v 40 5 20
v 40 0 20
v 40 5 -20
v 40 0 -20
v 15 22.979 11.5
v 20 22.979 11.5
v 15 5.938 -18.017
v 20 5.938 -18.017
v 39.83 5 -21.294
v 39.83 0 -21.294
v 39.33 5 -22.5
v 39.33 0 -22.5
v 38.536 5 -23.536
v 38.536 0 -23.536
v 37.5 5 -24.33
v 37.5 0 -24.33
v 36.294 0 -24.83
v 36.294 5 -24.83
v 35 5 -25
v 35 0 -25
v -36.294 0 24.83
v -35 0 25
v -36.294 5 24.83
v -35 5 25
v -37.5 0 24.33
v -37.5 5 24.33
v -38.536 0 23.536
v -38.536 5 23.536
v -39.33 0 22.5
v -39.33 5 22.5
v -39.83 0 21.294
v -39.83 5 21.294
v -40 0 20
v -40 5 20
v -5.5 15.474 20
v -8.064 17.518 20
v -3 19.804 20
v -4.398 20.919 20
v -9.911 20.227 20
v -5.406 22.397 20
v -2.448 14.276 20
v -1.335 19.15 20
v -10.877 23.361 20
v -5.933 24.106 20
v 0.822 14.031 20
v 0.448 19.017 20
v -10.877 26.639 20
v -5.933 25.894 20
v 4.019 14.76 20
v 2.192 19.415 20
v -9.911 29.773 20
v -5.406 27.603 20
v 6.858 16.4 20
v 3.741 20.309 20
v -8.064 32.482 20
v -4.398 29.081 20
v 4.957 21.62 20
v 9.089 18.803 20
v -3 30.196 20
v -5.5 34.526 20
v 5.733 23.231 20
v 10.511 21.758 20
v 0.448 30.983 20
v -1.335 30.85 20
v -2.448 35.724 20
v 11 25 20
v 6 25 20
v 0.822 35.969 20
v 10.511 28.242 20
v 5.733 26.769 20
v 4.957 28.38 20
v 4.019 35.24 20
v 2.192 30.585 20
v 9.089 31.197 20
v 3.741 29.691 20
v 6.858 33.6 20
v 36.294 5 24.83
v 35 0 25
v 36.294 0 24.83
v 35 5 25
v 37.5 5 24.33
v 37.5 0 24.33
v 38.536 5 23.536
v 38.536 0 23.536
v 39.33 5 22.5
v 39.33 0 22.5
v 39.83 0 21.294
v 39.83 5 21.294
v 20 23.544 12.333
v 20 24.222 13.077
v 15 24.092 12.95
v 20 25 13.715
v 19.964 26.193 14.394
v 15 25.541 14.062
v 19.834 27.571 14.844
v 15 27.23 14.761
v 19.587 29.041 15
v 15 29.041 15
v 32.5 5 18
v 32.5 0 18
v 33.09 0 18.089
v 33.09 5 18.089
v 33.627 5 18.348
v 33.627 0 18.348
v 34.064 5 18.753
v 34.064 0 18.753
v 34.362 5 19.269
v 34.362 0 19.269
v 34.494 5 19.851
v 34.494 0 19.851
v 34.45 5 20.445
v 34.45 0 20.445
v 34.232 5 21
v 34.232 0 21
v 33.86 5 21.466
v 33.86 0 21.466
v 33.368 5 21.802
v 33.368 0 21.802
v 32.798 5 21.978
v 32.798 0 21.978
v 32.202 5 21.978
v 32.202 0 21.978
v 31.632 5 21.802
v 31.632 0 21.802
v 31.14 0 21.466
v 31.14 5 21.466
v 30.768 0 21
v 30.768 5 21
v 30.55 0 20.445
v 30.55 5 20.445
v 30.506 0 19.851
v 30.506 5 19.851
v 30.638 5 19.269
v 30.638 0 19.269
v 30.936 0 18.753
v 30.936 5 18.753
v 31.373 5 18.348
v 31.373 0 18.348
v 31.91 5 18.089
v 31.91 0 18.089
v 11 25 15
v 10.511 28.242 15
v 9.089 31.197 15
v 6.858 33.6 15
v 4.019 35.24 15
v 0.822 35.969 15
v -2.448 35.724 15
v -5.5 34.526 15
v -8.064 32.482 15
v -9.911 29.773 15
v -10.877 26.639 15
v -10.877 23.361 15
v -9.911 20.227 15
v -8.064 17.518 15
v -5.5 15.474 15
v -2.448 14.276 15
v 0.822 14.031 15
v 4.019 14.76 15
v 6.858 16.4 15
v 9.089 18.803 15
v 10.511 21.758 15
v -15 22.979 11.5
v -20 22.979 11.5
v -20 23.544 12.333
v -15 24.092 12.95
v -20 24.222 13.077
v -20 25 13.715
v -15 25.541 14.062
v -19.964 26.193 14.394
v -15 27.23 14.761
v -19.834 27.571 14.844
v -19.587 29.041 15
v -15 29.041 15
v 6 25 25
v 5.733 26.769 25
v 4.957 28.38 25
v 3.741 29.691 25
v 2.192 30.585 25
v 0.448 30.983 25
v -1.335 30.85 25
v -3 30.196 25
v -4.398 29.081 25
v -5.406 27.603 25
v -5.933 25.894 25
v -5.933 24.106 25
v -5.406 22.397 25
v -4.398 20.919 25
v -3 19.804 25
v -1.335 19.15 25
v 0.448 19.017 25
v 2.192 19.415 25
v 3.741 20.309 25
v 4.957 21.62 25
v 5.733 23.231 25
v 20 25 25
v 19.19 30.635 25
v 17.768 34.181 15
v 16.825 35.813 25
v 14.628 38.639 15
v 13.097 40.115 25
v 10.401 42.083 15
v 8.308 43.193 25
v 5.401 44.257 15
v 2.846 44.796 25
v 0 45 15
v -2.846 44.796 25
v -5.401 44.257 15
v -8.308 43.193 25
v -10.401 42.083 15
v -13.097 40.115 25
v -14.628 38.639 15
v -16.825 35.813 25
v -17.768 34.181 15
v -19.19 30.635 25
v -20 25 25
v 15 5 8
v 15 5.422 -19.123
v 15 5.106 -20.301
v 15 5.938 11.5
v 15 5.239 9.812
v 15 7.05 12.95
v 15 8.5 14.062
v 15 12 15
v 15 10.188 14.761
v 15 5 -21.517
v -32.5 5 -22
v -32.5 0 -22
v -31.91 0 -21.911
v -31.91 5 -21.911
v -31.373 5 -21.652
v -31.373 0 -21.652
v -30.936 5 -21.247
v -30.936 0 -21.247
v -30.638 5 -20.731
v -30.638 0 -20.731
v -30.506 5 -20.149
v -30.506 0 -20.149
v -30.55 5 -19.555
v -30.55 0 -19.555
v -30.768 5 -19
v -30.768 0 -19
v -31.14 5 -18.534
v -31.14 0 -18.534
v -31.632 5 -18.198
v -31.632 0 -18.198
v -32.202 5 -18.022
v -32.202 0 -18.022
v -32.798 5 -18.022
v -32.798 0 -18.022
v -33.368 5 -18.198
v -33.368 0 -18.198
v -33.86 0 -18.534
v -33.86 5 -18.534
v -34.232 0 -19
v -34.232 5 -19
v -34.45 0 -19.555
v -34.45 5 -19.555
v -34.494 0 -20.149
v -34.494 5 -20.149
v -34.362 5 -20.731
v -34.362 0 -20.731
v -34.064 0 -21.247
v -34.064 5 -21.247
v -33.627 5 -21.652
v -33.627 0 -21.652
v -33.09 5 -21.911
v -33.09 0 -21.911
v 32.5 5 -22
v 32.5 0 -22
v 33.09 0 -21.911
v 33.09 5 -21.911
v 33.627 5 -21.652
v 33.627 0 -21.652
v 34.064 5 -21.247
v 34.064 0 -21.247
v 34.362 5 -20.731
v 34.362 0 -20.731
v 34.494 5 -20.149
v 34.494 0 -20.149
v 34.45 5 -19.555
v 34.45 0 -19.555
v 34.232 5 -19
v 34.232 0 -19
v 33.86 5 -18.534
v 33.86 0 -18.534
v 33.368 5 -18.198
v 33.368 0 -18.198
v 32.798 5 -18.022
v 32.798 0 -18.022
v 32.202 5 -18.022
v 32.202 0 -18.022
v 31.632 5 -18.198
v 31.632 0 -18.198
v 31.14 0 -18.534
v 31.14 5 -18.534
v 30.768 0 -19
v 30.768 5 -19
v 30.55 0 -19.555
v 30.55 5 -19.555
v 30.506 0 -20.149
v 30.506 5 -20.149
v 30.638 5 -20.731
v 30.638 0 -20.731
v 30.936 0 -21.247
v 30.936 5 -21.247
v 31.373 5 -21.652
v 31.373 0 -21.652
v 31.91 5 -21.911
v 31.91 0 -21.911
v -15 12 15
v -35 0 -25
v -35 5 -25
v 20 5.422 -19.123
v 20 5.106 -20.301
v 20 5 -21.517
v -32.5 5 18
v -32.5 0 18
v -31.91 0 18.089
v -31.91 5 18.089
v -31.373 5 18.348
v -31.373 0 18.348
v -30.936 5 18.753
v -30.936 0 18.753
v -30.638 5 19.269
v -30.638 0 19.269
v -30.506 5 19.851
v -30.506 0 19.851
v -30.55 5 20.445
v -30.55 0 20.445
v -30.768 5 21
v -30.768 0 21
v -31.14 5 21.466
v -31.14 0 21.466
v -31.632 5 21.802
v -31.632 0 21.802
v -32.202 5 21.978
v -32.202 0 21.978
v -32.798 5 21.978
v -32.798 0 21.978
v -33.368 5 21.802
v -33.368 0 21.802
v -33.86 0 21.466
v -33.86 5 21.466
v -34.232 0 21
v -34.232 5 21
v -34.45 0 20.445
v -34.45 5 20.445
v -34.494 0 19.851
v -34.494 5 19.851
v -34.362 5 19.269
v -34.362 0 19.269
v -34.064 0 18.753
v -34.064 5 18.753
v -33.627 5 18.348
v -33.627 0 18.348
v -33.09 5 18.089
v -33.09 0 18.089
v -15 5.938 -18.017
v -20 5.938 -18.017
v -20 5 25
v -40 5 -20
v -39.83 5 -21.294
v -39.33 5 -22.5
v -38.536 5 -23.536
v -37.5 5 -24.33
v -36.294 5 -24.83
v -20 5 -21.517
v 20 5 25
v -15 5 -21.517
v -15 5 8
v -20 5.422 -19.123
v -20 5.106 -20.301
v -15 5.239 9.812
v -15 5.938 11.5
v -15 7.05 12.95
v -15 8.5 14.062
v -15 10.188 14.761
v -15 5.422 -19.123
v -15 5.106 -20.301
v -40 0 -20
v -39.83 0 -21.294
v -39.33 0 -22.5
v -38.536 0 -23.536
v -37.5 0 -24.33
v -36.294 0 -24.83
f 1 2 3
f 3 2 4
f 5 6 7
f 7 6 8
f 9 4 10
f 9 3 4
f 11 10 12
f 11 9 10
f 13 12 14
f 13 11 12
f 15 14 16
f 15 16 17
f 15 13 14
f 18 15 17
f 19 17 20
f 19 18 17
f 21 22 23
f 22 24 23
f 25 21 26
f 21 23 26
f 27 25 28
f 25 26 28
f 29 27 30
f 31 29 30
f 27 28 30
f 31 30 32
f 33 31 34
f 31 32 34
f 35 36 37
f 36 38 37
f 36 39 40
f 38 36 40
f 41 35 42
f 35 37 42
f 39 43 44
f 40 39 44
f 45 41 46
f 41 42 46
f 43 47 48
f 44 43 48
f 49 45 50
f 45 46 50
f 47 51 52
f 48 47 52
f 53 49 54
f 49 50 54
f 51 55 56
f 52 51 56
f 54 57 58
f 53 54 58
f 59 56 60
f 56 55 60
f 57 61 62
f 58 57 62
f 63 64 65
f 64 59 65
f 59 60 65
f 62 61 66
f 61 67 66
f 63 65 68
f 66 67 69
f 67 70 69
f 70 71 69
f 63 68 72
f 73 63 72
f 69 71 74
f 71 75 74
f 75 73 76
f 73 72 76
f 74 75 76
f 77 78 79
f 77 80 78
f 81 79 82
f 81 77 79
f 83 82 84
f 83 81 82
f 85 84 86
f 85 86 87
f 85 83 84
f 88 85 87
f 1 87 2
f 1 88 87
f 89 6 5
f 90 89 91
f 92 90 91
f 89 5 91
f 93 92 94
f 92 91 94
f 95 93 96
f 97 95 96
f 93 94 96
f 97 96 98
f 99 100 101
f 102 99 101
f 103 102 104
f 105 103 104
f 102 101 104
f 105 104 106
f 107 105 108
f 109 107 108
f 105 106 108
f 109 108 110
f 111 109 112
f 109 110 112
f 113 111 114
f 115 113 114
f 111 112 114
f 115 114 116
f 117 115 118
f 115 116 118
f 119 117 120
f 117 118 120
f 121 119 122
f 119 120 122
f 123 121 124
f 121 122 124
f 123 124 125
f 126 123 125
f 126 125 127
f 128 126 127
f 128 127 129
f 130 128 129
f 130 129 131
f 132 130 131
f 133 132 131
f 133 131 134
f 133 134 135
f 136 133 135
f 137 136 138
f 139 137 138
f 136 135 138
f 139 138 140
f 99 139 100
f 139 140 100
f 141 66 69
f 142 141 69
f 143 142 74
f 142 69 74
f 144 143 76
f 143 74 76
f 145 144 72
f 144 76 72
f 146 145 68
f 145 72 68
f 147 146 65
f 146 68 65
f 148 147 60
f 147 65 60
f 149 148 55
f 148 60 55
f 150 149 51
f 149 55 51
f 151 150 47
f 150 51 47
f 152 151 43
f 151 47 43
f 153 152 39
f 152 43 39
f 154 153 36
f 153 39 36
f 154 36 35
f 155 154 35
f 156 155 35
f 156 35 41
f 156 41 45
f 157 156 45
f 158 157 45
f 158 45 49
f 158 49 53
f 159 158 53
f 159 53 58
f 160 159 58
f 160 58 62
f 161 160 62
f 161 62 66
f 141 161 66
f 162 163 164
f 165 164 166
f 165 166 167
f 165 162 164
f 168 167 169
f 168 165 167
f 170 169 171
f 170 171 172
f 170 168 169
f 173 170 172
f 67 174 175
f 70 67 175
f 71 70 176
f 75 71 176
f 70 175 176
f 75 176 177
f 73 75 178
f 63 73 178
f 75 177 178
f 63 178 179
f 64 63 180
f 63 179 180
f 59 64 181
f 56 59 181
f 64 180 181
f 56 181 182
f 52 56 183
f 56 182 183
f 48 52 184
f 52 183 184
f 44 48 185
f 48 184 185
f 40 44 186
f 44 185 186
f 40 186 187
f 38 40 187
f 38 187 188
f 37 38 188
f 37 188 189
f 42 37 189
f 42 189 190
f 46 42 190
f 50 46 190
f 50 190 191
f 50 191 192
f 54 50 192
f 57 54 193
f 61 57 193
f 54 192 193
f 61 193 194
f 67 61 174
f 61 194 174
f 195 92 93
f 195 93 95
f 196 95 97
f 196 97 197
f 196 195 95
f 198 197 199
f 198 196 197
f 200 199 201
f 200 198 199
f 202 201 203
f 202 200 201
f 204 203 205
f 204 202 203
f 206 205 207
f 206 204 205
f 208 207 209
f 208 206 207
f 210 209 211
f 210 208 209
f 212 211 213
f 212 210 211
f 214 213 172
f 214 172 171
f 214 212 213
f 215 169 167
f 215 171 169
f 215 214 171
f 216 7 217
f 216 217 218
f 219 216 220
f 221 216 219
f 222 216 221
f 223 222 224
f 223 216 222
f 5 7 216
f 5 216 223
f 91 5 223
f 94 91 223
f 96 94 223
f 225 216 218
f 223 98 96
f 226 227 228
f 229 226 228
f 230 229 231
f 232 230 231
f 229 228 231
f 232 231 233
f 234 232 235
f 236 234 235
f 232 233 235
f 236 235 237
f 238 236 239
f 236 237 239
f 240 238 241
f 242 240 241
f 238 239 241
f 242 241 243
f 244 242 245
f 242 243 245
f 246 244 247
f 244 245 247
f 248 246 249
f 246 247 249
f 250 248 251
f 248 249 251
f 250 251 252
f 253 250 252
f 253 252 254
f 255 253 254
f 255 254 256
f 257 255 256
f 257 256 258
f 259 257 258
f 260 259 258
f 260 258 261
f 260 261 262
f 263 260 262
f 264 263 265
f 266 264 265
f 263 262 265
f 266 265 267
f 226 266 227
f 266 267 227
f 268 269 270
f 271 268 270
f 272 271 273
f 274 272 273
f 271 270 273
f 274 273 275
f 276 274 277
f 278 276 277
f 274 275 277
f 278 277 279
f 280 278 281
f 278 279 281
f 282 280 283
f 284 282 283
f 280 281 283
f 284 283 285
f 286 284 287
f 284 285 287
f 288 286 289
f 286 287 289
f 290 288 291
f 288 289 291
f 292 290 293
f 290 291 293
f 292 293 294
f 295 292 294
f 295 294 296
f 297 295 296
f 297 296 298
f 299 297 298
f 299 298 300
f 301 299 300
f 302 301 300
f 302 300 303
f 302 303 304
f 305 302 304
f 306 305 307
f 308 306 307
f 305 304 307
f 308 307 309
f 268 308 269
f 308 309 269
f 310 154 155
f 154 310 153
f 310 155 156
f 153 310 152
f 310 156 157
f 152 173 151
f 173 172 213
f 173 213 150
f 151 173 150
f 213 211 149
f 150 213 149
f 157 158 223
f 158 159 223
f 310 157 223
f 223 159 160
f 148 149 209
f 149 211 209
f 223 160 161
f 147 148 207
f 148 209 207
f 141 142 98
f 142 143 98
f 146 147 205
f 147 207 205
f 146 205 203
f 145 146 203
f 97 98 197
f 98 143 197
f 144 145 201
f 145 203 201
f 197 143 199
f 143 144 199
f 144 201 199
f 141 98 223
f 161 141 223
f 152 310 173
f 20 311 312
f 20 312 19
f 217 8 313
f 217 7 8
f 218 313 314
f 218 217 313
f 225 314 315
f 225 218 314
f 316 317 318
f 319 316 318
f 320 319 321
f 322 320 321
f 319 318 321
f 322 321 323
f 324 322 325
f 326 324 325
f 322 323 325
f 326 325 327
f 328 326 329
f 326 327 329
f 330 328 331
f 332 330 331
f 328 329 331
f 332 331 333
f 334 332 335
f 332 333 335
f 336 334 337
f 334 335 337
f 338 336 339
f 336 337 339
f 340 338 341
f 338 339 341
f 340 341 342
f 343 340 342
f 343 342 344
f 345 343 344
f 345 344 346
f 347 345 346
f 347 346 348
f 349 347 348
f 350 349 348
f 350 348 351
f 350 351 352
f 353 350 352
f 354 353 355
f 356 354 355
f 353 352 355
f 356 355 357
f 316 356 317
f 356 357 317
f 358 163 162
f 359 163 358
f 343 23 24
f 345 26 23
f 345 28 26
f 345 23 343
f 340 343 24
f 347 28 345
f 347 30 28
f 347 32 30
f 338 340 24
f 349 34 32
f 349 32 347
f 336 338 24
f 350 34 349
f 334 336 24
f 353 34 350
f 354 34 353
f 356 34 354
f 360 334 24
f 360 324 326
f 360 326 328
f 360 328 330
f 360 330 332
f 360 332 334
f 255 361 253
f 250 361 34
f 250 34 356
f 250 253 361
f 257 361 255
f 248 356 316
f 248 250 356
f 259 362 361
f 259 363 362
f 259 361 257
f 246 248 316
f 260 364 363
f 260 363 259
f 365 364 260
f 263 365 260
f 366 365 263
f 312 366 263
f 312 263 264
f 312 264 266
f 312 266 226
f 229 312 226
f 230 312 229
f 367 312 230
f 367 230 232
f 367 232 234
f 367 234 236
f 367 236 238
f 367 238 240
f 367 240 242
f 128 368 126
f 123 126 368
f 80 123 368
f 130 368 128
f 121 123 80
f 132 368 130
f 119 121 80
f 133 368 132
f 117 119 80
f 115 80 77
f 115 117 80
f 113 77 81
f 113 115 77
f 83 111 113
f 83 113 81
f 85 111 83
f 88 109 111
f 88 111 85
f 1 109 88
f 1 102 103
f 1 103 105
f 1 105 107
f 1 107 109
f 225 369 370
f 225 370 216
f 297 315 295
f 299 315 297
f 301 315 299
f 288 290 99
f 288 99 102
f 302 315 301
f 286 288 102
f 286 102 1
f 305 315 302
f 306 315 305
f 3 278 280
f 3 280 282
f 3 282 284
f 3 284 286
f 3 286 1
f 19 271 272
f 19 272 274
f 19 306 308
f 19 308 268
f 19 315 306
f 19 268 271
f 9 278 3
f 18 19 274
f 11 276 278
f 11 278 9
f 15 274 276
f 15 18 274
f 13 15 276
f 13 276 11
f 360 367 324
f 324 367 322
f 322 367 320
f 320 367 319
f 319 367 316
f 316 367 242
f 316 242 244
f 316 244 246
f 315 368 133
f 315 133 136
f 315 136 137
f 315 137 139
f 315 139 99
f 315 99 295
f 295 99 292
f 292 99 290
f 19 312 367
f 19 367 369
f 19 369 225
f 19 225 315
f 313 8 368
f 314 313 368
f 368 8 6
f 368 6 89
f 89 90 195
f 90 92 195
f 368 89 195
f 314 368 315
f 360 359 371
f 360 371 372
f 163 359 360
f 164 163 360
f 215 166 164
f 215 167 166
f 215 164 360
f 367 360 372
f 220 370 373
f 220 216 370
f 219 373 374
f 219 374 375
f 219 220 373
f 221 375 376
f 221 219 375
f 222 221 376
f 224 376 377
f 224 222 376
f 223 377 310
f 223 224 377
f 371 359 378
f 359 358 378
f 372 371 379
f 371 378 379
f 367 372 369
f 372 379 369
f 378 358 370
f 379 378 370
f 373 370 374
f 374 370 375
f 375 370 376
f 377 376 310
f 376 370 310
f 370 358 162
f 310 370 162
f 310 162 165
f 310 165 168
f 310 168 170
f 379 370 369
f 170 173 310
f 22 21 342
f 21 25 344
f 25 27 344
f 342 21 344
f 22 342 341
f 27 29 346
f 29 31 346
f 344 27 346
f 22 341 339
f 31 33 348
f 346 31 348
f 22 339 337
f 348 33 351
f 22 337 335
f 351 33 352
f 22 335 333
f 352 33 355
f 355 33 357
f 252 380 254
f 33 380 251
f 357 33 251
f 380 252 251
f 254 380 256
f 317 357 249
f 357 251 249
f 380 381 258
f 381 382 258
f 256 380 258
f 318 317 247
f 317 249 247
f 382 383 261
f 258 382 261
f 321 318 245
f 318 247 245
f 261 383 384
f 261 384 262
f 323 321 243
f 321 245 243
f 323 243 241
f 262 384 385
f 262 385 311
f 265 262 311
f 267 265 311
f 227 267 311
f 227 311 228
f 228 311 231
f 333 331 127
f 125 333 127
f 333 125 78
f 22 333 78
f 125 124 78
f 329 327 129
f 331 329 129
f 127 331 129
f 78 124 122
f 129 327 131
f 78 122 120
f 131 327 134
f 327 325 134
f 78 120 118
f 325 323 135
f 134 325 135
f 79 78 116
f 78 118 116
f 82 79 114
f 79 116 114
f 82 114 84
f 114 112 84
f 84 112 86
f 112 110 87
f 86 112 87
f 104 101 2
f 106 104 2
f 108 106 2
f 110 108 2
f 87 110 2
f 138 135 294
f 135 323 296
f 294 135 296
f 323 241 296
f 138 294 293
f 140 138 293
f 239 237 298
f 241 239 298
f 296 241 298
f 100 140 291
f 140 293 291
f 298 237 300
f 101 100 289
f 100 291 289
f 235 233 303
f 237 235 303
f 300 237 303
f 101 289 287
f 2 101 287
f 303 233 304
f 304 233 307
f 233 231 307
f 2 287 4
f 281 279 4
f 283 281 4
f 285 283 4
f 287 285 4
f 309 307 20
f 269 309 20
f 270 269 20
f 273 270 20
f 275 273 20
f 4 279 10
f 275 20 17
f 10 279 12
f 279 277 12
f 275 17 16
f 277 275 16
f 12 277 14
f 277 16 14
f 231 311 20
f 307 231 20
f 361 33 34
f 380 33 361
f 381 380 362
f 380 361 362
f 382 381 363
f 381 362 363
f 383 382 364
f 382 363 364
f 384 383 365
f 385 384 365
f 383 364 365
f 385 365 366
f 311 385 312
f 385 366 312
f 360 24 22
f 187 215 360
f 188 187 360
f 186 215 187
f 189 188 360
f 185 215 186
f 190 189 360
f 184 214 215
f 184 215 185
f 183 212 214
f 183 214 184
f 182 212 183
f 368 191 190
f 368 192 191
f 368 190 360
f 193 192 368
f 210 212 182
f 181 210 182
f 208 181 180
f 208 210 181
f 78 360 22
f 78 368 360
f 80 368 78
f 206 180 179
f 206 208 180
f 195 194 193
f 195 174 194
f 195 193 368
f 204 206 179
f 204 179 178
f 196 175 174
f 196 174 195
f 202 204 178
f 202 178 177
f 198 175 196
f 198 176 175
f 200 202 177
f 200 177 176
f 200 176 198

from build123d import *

# Parameters (mm, degrees)
SKETCH1_W           = 80
SKETCH1_H           = 50
BOSS_EXTRUDE1_DEPTH = 5
SKETCH4_R           = 11
BOSS_EXTRUDE2_DEPTH = 10
SKETCH5_R           = 11
SKETCH5_R_2         = 6
BOSS_EXTRUDE3_DEPTH = 5
BOSS_EXTRUDE4_DEPTH = 5
FILLET2_R           = 7
SKETCH7_R           = 2
CUT_EXTRUDE1_DEPTH  = 5
FILLET3_R           = 5


with BuildPart() as part:
    # Sketch1 → Boss-Extrude1 (new body)
    with BuildSketch(Plane(origin=(0, 0, 0), x_dir=(1, 0, 0), z_dir=(0, 1, 0))):
        Rectangle(SKETCH1_W, SKETCH1_H)
    extrude(amount=BOSS_EXTRUDE1_DEPTH)

    # Sketch4 → Boss-Extrude2 (add)
    with BuildSketch(Plane.XY.offset(25)):
        with BuildLine():
            Line((-20, 25), (-20, 5))
            Line((-20, 5), (20, 5))
            Line((20, 5), (20, 25))
            ThreePointArc((20, 25), (0, 45), (-20, 25))
        make_face()
        with Locations((0, 25)):
            Circle(SKETCH4_R, mode=Mode.SUBTRACT)
    extrude(amount=-BOSS_EXTRUDE2_DEPTH)

    # Sketch5 → Boss-Extrude3 (add)
    with BuildSketch(Plane.XY.offset(25)):
        with Locations((0, 25)):
            Circle(SKETCH5_R)
        with Locations((0, 25)):
            Circle(SKETCH5_R_2, mode=Mode.SUBTRACT)
    extrude(amount=-BOSS_EXTRUDE3_DEPTH)

    # Sketch6 → Boss-Extrude4 (add)
    with BuildSketch(Plane.ZY.offset(20)):
        Polygon((15, 25), (-19.641016151, 5), (15, 5), align=None)
    boss_extrude4 = extrude(amount=-BOSS_EXTRUDE4_DEPTH)

    # Mirror1: Boss-Extrude4 across plane
    add(boss_extrude4.mirror(Plane(origin=(0, 0, 0), x_dir=(0, 0, 1), z_dir=(1, 0, 0))))

    # Fillet2
    fillet2_edges = [part.edges().sort_by_distance(p)[0] for p in [
        (0, 5, 15),
        (-17.5, 25, 15),
        (-17.5, 5, -19.641016151),
        (17.5, 25, 15),
        (17.5, 5, -19.641016151),
    ]]
    fillet(fillet2_edges, radius=FILLET2_R)

    # Sketch7 → Cut-Extrude1 (cut)
    with BuildSketch(Plane.XZ):
        with Locations(Location((-32.5, 20, 0), (0, 0, 270))):
            Circle(SKETCH7_R)
        with Locations(Location((-32.5, -20, 0), (0, 0, 270))):
            Circle(SKETCH7_R)
        with Locations(Location((32.5, -20, 0), (0, 0, 270))):
            Circle(SKETCH7_R)
        with Locations(Location((32.5, 20, 0), (0, 0, 270))):
            Circle(SKETCH7_R)
    extrude(amount=-CUT_EXTRUDE1_DEPTH, mode=Mode.SUBTRACT)

    # Fillet3
    fillet3_edges = [part.edges().sort_by_distance(p)[0] for p in [
        (40, 2.5, 25),
        (-40, 2.5, 25),
        (-40, 2.5, -25),
        (40, 2.5, -25),
    ]]
    fillet(fillet3_edges, radius=FILLET3_R)


solid = part.part
